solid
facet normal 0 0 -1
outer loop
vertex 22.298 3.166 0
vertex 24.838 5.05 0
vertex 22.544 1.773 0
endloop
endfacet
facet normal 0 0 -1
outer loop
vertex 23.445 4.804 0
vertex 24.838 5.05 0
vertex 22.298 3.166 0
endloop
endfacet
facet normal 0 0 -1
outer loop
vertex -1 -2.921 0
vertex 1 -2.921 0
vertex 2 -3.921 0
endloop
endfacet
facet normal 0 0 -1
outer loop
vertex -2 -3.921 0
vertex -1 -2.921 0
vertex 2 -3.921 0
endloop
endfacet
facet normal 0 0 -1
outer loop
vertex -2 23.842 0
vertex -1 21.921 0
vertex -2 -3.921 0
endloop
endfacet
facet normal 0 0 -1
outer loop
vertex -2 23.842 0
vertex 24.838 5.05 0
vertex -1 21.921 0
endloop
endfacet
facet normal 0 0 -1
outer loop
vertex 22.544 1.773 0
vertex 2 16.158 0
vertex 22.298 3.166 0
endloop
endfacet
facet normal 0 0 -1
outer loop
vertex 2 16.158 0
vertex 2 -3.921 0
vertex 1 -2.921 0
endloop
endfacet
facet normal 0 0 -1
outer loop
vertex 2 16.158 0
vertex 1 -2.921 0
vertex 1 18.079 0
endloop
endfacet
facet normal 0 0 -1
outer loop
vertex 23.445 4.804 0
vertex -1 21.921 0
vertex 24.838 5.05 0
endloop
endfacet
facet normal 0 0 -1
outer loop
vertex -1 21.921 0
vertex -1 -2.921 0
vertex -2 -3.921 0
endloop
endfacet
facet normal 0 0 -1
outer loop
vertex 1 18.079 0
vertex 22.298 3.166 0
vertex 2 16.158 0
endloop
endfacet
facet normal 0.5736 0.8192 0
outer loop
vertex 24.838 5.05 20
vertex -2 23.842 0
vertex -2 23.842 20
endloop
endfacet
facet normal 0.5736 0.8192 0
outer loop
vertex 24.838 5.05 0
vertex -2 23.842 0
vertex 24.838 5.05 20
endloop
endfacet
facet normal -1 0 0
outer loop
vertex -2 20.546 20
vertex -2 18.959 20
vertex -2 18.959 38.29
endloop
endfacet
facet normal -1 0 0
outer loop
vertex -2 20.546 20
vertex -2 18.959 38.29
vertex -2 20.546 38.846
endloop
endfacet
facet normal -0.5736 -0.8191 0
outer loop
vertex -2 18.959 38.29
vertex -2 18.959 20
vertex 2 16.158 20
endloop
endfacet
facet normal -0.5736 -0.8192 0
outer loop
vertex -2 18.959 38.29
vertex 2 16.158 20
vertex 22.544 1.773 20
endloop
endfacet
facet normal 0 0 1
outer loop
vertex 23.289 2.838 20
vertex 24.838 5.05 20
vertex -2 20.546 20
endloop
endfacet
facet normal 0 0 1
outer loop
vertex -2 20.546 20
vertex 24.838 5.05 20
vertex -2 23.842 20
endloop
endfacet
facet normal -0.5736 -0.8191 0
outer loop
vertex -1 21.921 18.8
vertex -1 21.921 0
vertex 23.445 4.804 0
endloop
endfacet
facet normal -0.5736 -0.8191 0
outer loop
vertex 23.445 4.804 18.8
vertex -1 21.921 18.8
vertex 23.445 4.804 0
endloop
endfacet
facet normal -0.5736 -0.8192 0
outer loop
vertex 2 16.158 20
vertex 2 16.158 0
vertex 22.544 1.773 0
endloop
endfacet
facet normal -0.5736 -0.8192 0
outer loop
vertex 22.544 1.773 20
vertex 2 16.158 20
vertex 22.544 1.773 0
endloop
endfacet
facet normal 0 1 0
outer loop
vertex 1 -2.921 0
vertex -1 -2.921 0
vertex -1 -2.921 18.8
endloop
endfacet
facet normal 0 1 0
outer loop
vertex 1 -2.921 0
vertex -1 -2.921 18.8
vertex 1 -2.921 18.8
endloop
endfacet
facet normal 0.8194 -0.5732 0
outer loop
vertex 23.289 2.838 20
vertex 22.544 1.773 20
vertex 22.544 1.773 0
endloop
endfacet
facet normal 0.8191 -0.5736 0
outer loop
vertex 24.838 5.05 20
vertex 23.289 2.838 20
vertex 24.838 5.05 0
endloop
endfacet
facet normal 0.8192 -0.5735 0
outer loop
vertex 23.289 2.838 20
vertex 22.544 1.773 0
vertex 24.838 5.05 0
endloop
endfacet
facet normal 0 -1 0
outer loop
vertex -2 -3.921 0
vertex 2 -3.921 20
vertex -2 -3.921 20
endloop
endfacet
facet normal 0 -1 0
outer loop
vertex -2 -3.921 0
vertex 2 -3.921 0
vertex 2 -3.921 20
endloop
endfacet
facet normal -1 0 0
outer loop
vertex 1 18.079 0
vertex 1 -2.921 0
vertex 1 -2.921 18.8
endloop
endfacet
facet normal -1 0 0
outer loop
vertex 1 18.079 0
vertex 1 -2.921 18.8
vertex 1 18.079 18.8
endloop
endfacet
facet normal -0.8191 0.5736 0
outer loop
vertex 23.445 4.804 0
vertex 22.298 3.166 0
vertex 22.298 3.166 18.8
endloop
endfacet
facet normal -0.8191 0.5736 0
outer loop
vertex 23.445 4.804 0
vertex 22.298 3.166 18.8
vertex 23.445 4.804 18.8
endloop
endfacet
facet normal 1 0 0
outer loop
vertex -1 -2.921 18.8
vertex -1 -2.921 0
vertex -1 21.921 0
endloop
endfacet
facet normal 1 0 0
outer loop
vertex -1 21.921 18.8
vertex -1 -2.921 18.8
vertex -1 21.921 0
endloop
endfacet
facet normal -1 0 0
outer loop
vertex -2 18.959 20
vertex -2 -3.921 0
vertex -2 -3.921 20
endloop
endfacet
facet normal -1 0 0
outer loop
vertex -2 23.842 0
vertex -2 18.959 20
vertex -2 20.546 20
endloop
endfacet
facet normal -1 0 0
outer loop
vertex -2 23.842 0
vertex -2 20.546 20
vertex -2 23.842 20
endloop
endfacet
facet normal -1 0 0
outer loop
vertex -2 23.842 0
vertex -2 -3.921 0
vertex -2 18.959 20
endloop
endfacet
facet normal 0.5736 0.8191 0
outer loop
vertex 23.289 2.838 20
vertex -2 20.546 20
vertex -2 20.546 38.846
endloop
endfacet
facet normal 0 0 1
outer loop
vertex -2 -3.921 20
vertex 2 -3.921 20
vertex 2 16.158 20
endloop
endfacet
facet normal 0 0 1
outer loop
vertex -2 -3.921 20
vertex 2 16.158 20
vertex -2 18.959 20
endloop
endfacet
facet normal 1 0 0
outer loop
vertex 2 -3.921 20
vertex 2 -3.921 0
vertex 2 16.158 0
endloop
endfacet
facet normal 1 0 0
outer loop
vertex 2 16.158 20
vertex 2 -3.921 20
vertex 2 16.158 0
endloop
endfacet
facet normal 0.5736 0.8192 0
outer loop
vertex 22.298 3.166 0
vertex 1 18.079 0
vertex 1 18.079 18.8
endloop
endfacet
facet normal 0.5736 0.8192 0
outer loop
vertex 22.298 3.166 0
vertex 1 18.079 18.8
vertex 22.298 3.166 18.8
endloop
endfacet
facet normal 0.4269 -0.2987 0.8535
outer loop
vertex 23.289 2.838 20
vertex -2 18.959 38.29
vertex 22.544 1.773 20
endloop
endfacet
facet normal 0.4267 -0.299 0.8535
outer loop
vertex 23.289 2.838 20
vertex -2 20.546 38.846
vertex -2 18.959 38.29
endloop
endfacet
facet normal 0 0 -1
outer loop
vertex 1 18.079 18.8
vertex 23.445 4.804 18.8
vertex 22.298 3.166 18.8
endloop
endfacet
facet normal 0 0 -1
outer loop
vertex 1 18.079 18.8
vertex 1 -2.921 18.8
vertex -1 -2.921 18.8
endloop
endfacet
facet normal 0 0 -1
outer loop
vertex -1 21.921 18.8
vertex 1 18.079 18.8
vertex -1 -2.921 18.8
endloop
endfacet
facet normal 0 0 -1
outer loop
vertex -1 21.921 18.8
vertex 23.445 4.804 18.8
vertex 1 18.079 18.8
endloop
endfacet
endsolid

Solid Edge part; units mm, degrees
sketch "Sketch1" plane through (0, 0, 0) normal (0, 0, 1) x (1, 0, 0)
  line L0 (-1, 21.921) -> (23.4451, 4.8043)
  line L1 (22.298, 3.166) -> (23.4451, 4.8043)
  line L2 (1, 18.079) -> (22.298, 3.166)
  line L3 (1, -2.921) -> (1, 18.079)
  line L4 (-1, -2.921) -> (1, -2.921)
  line L5 (-1, -2.921) -> (-1, 21.921)
  line L6 (-2, 23.842) -> (24.8378, 5.0499)
  line L7 (22.5435, 1.7733) -> (24.8378, 5.0499)
  line L8 (2, 16.158) -> (22.5435, 1.7733)
  line L9 (2, -3.921) -> (2, 16.158)
  line L10 (2, -3.921) -> (-2, -3.921)
  line L11 (-2, -3.921) -> (-2, 23.842)
  dimension "D1" = 2
  dimension "D2" = 1
  dimension "D3" = 1
  dimension "D4" = 1
  dimension "D5" = 1.3927
extrude "Protrusion1" add sketch "Sketch1" along normal blind 20
sketch "Sketch2" plane through (11.649, 10.6225, 10) normal (0.5735764, 0.819152, 0) x (0.819152, -0.5735764, 0)
  line L0 (-18.7629, -30) -> (14, -10)
  line L1 (14, -10) -> (-18.7629, -10)
  line L2 (-18.7629, -10) -> (-18.7629, -30)
extrude "ProtrusioneEstrusa_4" add sketch "Sketch2" against normal up to vertex (1 mm away) and the other way blind 0.3
sketch "Sketch3" plane through (11.4189, 13.3401, 20) normal (0, 0, 1) x (-0.819152, 0.5735764, 0)
  line L0 (-15.7472, -0.9059) -> (-15.7472, 3.0941)
  line L1 (-15.7472, 3.0941) -> (9.3318, 3.0941)
  line L2 (9.3318, 3.0941) -> (-2.185, 19.5419)
  line L3 (-2.185, 19.5419) -> (1.0916, 21.8362)
  line L4 (1.0916, 21.8362) -> (17.0158, -0.9059)
  line L5 (17.0158, -0.9059) -> (-15.7472, -0.9059)
extrude "ProtrusioneEstrusa_5" add sketch "Sketch3" against normal blind 1.2
sketch "Sketch4" plane through (-3.1472, 20.2946, 20) normal (0, 0, -1) x (-0.819152, 0.5735764, 0)
  line L0 (-0.7955, 0.8638) -> (1.095, 0.8638)
  line L1 (1.095, 0.8638) -> (1.095, -0.4362)
  line L2 (1.095, -0.4362) -> (-1.7058, -0.4362)
  line L3 (-1.7058, -0.4362) -> (-0.7955, 0.8638)
extrude "ScavoEstrusione_3" cut sketch "Sketch4" against normal blind 20.5093 and the other way blind 1.027
